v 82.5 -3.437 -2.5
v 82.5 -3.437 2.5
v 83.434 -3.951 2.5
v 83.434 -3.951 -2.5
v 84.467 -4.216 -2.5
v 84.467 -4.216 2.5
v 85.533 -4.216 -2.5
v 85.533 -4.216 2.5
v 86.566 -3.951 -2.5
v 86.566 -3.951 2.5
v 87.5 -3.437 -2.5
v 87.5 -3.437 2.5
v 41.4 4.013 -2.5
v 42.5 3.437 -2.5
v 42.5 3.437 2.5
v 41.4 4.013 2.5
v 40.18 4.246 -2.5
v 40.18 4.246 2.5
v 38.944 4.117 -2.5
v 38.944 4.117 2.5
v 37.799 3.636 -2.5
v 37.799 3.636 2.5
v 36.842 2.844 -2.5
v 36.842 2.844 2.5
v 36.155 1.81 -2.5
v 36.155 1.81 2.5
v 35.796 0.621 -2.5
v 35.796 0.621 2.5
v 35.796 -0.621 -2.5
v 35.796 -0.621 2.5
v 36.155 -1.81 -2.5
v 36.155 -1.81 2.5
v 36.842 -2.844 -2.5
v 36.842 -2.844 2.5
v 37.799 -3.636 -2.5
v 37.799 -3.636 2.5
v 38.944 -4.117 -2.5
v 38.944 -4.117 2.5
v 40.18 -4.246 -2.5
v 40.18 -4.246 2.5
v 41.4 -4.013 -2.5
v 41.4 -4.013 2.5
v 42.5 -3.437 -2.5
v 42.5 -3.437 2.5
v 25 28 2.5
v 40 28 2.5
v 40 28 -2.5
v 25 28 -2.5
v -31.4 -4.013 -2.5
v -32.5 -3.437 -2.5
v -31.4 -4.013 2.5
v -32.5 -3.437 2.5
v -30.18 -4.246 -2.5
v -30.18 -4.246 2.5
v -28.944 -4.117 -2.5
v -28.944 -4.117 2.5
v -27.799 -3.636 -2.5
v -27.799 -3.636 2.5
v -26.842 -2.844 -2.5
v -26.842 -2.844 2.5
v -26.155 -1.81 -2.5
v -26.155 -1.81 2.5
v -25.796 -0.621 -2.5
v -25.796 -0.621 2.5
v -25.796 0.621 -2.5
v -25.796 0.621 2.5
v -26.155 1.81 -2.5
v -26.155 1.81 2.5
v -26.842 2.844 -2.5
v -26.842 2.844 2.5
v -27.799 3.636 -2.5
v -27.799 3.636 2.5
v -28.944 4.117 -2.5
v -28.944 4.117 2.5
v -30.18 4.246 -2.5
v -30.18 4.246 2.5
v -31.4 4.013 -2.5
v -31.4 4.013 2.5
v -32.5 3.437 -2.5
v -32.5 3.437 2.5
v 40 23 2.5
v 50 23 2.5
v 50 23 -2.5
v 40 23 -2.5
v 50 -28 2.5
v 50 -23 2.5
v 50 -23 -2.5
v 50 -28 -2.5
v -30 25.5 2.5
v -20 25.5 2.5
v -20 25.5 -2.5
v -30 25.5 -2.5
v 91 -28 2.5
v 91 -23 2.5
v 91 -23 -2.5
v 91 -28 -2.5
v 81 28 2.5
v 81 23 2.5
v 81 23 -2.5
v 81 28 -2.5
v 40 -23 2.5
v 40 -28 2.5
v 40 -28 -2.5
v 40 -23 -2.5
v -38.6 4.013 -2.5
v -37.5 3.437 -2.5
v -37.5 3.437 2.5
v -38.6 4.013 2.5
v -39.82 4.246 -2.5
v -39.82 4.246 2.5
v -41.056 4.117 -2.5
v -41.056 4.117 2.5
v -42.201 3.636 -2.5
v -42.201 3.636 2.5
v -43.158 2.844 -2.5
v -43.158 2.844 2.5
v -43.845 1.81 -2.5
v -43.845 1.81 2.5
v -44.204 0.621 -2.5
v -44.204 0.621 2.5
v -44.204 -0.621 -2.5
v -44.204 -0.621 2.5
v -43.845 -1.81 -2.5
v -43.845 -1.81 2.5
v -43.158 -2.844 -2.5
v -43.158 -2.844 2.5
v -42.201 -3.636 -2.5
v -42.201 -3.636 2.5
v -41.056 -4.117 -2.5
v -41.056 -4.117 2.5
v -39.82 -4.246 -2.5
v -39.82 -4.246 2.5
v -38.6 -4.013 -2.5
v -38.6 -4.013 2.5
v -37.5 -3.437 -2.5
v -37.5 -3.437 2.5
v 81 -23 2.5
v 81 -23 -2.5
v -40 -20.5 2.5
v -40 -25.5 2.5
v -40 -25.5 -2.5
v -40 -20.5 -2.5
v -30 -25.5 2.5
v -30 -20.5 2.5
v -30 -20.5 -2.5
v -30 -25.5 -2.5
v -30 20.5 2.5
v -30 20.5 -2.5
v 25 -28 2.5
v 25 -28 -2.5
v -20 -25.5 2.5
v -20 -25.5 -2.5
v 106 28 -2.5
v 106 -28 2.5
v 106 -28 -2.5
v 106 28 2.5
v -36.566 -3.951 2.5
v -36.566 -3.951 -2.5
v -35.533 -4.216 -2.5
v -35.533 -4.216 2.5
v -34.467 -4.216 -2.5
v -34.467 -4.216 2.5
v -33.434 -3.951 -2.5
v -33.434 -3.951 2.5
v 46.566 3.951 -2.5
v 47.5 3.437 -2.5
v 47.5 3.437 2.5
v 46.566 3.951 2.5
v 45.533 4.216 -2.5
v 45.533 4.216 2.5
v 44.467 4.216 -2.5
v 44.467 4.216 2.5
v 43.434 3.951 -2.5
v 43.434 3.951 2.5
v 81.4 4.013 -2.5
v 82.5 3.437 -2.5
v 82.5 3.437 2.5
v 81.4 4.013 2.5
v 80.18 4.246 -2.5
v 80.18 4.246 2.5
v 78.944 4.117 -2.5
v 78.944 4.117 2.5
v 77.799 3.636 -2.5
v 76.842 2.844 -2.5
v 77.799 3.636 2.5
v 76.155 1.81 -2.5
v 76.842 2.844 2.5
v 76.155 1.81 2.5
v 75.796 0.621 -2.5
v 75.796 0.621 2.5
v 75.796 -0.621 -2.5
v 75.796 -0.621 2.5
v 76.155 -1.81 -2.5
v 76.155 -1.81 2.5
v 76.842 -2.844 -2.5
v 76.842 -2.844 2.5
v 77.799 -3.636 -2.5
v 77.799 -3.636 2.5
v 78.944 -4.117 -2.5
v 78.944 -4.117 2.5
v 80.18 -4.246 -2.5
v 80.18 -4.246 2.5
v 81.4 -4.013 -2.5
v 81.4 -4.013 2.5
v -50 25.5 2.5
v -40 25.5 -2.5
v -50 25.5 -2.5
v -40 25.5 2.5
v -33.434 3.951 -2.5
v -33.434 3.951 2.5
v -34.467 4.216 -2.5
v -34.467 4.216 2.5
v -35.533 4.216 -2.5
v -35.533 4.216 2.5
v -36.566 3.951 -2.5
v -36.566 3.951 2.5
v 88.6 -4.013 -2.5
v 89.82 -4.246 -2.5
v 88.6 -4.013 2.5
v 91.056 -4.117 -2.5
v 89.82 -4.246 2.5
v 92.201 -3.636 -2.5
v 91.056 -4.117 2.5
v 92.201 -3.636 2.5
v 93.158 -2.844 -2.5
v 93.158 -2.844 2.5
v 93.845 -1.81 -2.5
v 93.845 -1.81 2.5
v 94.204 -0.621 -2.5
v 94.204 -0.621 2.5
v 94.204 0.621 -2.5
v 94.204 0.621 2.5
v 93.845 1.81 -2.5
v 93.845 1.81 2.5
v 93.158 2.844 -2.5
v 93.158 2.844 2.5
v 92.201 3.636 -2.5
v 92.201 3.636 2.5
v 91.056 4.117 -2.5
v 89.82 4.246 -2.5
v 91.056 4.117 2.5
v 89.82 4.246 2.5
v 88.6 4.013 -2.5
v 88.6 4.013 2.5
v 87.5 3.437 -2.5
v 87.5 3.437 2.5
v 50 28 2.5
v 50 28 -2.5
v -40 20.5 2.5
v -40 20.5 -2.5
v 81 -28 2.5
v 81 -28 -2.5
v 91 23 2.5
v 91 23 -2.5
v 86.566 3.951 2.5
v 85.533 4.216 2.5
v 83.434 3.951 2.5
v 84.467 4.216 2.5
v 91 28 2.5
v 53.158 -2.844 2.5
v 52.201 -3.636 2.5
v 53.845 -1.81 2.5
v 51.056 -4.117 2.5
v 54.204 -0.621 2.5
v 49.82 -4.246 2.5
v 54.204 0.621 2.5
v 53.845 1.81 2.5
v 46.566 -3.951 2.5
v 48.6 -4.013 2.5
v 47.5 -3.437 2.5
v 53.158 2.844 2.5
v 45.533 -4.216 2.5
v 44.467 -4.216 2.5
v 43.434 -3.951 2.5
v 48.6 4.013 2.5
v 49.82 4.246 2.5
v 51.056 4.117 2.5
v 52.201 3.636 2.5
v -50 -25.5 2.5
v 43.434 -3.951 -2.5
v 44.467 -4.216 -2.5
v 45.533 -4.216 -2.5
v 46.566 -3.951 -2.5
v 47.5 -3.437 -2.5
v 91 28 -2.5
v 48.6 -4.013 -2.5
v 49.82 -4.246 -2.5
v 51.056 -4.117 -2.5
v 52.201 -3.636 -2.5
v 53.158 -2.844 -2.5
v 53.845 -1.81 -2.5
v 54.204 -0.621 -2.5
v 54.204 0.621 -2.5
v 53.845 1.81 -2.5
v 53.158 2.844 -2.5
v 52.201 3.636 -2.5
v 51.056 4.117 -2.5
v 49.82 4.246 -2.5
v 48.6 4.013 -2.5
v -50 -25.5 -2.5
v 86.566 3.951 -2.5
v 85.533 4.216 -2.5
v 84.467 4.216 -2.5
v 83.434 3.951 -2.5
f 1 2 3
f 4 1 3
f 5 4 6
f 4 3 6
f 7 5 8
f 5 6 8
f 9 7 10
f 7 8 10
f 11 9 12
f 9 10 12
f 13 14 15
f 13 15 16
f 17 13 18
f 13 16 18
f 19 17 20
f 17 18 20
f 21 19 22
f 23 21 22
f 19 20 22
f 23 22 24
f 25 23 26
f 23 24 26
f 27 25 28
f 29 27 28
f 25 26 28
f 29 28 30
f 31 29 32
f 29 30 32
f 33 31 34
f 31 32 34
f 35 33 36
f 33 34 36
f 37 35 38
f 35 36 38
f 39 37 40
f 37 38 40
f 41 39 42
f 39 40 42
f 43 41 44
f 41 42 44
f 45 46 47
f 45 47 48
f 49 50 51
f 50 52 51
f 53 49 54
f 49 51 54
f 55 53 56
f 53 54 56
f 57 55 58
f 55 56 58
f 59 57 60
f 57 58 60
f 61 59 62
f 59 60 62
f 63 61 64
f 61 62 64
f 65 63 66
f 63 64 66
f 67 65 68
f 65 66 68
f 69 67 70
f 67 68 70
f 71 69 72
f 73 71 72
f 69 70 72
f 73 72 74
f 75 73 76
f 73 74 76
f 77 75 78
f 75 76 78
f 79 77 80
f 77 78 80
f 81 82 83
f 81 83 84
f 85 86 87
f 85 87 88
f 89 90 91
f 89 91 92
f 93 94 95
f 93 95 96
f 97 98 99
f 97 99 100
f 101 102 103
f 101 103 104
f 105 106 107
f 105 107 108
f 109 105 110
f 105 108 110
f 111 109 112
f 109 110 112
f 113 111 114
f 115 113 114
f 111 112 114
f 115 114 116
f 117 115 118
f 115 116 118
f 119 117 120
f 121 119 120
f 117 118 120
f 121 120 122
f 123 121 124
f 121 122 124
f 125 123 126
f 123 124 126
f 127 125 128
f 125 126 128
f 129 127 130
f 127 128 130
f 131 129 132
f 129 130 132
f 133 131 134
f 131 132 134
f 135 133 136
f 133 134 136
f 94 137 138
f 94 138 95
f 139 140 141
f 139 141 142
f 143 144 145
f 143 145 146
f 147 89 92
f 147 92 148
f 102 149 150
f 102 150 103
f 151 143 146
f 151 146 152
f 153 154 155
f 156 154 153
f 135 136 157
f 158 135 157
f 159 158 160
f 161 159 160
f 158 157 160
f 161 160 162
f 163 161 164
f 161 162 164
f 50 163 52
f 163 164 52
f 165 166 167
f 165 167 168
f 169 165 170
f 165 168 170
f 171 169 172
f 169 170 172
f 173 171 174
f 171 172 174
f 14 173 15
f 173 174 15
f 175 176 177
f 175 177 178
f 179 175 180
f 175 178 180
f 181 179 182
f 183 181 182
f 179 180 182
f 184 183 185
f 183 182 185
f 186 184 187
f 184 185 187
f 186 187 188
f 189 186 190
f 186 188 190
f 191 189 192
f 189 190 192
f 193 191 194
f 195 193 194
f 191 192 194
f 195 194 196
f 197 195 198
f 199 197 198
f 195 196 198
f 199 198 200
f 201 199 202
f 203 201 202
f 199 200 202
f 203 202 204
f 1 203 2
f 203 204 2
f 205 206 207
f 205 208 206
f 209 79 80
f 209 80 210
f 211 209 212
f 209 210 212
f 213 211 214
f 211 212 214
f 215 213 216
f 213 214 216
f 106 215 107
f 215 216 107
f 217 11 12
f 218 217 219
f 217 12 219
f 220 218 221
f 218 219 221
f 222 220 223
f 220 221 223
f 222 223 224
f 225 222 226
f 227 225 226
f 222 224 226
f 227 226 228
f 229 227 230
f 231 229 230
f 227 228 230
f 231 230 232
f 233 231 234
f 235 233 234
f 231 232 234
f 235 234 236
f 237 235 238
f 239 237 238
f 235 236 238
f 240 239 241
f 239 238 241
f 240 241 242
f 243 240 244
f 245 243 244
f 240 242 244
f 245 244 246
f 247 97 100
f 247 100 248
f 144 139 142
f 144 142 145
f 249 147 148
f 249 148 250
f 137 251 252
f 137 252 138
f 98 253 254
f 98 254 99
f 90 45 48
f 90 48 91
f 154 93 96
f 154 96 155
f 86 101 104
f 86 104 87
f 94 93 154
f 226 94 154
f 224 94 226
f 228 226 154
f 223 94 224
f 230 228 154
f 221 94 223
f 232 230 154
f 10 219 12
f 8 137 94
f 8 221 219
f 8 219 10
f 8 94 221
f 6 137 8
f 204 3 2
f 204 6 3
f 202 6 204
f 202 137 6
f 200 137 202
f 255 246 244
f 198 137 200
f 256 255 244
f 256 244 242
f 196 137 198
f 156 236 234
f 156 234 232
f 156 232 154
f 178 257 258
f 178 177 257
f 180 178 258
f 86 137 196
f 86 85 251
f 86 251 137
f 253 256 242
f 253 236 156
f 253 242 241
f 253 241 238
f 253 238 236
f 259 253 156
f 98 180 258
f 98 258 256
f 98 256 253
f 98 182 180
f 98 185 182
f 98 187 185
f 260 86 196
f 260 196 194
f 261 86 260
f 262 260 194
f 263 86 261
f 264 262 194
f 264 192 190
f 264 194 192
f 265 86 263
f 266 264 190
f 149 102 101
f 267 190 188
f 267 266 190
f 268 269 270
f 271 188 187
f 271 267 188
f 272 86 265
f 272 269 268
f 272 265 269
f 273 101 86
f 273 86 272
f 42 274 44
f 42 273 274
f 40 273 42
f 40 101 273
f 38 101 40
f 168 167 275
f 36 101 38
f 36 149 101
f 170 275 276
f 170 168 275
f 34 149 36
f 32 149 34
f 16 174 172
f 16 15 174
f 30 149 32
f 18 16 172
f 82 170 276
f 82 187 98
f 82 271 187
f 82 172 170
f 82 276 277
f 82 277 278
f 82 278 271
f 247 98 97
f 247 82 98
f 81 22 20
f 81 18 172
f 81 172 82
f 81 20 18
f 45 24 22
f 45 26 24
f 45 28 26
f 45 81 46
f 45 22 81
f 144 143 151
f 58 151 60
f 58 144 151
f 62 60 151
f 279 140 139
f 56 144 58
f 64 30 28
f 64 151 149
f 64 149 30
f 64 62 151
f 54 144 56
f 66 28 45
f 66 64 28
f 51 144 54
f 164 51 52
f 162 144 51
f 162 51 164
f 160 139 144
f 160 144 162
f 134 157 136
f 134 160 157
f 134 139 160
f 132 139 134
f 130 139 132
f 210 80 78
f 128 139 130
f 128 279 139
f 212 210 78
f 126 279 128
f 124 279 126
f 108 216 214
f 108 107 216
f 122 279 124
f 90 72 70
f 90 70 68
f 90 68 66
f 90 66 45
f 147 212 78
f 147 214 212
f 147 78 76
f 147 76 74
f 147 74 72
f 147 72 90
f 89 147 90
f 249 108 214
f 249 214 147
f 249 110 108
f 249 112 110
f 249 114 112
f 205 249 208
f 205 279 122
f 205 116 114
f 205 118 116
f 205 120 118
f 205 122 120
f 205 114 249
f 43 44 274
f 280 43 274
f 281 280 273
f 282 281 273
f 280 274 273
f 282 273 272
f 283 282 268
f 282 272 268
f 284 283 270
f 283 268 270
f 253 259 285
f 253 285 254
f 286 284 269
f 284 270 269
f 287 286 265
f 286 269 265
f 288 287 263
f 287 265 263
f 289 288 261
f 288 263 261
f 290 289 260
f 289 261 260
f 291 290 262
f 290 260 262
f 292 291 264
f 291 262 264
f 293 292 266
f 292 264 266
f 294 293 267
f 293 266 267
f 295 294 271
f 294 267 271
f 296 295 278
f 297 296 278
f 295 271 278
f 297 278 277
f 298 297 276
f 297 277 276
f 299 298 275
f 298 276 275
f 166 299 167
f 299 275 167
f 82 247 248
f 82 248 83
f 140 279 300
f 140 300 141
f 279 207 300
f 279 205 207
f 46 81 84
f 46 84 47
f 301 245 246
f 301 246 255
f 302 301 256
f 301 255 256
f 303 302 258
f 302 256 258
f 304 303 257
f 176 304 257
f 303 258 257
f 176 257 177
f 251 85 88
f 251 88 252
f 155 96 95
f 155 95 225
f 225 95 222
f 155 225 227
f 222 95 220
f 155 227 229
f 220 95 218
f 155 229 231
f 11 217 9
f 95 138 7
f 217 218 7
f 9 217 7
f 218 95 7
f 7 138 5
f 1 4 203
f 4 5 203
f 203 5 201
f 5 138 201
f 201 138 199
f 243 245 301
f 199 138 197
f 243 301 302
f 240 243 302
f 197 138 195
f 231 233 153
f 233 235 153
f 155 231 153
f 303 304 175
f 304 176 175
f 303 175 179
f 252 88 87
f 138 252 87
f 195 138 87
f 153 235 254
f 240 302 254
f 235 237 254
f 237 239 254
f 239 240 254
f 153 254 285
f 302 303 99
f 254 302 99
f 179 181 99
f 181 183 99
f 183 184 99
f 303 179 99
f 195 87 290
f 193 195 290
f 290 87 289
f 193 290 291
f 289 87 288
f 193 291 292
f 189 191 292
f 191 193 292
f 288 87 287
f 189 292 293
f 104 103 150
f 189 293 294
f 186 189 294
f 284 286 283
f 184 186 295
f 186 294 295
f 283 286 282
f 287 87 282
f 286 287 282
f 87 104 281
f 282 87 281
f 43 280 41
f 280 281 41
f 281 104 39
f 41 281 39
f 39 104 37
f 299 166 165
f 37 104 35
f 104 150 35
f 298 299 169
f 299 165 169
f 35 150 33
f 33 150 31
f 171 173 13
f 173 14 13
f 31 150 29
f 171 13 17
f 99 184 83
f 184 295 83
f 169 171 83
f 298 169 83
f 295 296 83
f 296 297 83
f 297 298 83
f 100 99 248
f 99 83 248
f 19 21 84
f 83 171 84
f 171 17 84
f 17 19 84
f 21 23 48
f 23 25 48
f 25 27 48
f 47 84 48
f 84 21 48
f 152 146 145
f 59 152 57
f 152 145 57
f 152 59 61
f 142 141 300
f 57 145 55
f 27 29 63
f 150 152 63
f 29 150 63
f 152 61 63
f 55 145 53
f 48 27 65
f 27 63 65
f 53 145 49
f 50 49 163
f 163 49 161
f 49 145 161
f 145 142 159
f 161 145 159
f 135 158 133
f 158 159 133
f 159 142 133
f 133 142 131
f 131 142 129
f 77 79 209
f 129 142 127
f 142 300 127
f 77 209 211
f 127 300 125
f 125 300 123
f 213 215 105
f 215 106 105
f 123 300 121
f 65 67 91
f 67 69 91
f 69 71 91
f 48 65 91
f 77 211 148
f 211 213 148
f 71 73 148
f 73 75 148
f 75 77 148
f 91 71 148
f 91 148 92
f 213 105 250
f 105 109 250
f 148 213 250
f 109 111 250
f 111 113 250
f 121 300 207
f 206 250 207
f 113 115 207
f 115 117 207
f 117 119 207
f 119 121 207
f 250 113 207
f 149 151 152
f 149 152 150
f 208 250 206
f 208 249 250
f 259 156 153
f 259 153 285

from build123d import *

# Parameters (mm, degrees)
BOSS_EXTRUDE1_DEPTH = 2.5
CUT_EXTRUDE1_REACH  = 111.75
SKETCH2_R           = 4.25


with BuildPart() as part:
    # Sketch1 → Boss-Extrude1 (new, symmetric)
    with BuildSketch(Plane(origin=(0, 0, 0), x_dir=(0, 1, 0), z_dir=(0, 0, 1))):
        Polygon((25.5, 50), (-25.5, 50), (-25.5, 40), (-20.5, 40), (-20.5, 30), (-25.5, 30), (-25.5, 20), (-28, -25), (-28, -40), (-23, -40), (-23, -50), (-28, -50), (-28, -81), (-23, -81), (-23, -91), (-28, -91), (-28, -106), (28, -106), (28, -91), (23, -91), (23, -81), (28, -81), (28, -50), (23, -50), (23, -40), (28, -40), (28, -25), (25.5, 20), (25.5, 30), (20.5, 30), (20.5, 40), (25.5, 40), align=None)
    extrude(amount=BOSS_EXTRUDE1_DEPTH, both=True)

    # Sketch2 → Cut-Extrude1 (cut, up to next)
    with BuildSketch(Plane.XY.offset(2.5), mode=Mode.PRIVATE) as cut_extrude1_sk1:
        with Locations((-35, 0)):
            Circle(SKETCH2_R)
    cut_extrude1_tool1 = extrude(cut_extrude1_sk1.sketch, amount=-CUT_EXTRUDE1_REACH, mode=Mode.PRIVATE) & part.part
    # Sketch2 → Cut-Extrude1 (cut, up to next)
    with BuildSketch(Plane.XY.offset(2.5), mode=Mode.PRIVATE) as cut_extrude1_sk2:
        with Locations((45, 0)):
            Circle(SKETCH2_R)
    cut_extrude1_tool2 = extrude(cut_extrude1_sk2.sketch, amount=-CUT_EXTRUDE1_REACH, mode=Mode.PRIVATE) & part.part
    # Sketch2 → Cut-Extrude1 (cut, up to next)
    with BuildSketch(Plane.XY.offset(2.5), mode=Mode.PRIVATE) as cut_extrude1_sk3:
        with Locations((85, 0)):
            Circle(SKETCH2_R)
    cut_extrude1_tool3 = extrude(cut_extrude1_sk3.sketch, amount=-CUT_EXTRUDE1_REACH, mode=Mode.PRIVATE) & part.part
    # Sketch2 → Cut-Extrude1 (cut, up to next)
    with BuildSketch(Plane.XY.offset(2.5), mode=Mode.PRIVATE) as cut_extrude1_sk4:
        with Locations((90, 0)):
            Circle(SKETCH2_R)
    cut_extrude1_tool4 = extrude(cut_extrude1_sk4.sketch, amount=-CUT_EXTRUDE1_REACH, mode=Mode.PRIVATE) & part.part
    # Sketch2 → Cut-Extrude1 (cut, up to next)
    with BuildSketch(Plane.XY.offset(2.5), mode=Mode.PRIVATE) as cut_extrude1_sk5:
        with Locations((50, 0)):
            Circle(SKETCH2_R)
    cut_extrude1_tool5 = extrude(cut_extrude1_sk5.sketch, amount=-CUT_EXTRUDE1_REACH, mode=Mode.PRIVATE) & part.part
    # Sketch2 → Cut-Extrude1 (cut, up to next)
    with BuildSketch(Plane.XY.offset(2.5), mode=Mode.PRIVATE) as cut_extrude1_sk6:
        with Locations((-30, 0)):
            Circle(SKETCH2_R)
    cut_extrude1_tool6 = extrude(cut_extrude1_sk6.sketch, amount=-CUT_EXTRUDE1_REACH, mode=Mode.PRIVATE) & part.part
    # Sketch2 → Cut-Extrude1 (cut, up to next)
    with BuildSketch(Plane.XY.offset(2.5), mode=Mode.PRIVATE) as cut_extrude1_sk7:
        with Locations((80, 0)):
            Circle(SKETCH2_R)
    cut_extrude1_tool7 = extrude(cut_extrude1_sk7.sketch, amount=-CUT_EXTRUDE1_REACH, mode=Mode.PRIVATE) & part.part
    # Sketch2 → Cut-Extrude1 (cut, up to next)
    with BuildSketch(Plane.XY.offset(2.5), mode=Mode.PRIVATE) as cut_extrude1_sk8:
        with Locations((40, 0)):
            Circle(SKETCH2_R)
    cut_extrude1_tool8 = extrude(cut_extrude1_sk8.sketch, amount=-CUT_EXTRUDE1_REACH, mode=Mode.PRIVATE) & part.part
    # Sketch2 → Cut-Extrude1 (cut, up to next)
    with BuildSketch(Plane.XY.offset(2.5), mode=Mode.PRIVATE) as cut_extrude1_sk9:
        with Locations((-40, 0)):
            Circle(SKETCH2_R)
    cut_extrude1_tool9 = extrude(cut_extrude1_sk9.sketch, amount=-CUT_EXTRUDE1_REACH, mode=Mode.PRIVATE) & part.part
    add(cut_extrude1_tool1.solids().sort_by_distance((-35, 0, 2.5))[0], mode=Mode.SUBTRACT)
    add(cut_extrude1_tool2.solids().sort_by_distance((45, 0, 2.5))[0], mode=Mode.SUBTRACT)
    add(cut_extrude1_tool3.solids().sort_by_distance((85, 0, 2.5))[0], mode=Mode.SUBTRACT)
    add(cut_extrude1_tool4.solids().sort_by_distance((90, 0, 2.5))[0], mode=Mode.SUBTRACT)
    add(cut_extrude1_tool5.solids().sort_by_distance((50, 0, 2.5))[0], mode=Mode.SUBTRACT)
    add(cut_extrude1_tool6.solids().sort_by_distance((-30, 0, 2.5))[0], mode=Mode.SUBTRACT)
    add(cut_extrude1_tool7.solids().sort_by_distance((80, 0, 2.5))[0], mode=Mode.SUBTRACT)
    add(cut_extrude1_tool8.solids().sort_by_distance((40, 0, 2.5))[0], mode=Mode.SUBTRACT)
    add(cut_extrude1_tool9.solids().sort_by_distance((-40, 0, 2.5))[0], mode=Mode.SUBTRACT)


solid = part.part
